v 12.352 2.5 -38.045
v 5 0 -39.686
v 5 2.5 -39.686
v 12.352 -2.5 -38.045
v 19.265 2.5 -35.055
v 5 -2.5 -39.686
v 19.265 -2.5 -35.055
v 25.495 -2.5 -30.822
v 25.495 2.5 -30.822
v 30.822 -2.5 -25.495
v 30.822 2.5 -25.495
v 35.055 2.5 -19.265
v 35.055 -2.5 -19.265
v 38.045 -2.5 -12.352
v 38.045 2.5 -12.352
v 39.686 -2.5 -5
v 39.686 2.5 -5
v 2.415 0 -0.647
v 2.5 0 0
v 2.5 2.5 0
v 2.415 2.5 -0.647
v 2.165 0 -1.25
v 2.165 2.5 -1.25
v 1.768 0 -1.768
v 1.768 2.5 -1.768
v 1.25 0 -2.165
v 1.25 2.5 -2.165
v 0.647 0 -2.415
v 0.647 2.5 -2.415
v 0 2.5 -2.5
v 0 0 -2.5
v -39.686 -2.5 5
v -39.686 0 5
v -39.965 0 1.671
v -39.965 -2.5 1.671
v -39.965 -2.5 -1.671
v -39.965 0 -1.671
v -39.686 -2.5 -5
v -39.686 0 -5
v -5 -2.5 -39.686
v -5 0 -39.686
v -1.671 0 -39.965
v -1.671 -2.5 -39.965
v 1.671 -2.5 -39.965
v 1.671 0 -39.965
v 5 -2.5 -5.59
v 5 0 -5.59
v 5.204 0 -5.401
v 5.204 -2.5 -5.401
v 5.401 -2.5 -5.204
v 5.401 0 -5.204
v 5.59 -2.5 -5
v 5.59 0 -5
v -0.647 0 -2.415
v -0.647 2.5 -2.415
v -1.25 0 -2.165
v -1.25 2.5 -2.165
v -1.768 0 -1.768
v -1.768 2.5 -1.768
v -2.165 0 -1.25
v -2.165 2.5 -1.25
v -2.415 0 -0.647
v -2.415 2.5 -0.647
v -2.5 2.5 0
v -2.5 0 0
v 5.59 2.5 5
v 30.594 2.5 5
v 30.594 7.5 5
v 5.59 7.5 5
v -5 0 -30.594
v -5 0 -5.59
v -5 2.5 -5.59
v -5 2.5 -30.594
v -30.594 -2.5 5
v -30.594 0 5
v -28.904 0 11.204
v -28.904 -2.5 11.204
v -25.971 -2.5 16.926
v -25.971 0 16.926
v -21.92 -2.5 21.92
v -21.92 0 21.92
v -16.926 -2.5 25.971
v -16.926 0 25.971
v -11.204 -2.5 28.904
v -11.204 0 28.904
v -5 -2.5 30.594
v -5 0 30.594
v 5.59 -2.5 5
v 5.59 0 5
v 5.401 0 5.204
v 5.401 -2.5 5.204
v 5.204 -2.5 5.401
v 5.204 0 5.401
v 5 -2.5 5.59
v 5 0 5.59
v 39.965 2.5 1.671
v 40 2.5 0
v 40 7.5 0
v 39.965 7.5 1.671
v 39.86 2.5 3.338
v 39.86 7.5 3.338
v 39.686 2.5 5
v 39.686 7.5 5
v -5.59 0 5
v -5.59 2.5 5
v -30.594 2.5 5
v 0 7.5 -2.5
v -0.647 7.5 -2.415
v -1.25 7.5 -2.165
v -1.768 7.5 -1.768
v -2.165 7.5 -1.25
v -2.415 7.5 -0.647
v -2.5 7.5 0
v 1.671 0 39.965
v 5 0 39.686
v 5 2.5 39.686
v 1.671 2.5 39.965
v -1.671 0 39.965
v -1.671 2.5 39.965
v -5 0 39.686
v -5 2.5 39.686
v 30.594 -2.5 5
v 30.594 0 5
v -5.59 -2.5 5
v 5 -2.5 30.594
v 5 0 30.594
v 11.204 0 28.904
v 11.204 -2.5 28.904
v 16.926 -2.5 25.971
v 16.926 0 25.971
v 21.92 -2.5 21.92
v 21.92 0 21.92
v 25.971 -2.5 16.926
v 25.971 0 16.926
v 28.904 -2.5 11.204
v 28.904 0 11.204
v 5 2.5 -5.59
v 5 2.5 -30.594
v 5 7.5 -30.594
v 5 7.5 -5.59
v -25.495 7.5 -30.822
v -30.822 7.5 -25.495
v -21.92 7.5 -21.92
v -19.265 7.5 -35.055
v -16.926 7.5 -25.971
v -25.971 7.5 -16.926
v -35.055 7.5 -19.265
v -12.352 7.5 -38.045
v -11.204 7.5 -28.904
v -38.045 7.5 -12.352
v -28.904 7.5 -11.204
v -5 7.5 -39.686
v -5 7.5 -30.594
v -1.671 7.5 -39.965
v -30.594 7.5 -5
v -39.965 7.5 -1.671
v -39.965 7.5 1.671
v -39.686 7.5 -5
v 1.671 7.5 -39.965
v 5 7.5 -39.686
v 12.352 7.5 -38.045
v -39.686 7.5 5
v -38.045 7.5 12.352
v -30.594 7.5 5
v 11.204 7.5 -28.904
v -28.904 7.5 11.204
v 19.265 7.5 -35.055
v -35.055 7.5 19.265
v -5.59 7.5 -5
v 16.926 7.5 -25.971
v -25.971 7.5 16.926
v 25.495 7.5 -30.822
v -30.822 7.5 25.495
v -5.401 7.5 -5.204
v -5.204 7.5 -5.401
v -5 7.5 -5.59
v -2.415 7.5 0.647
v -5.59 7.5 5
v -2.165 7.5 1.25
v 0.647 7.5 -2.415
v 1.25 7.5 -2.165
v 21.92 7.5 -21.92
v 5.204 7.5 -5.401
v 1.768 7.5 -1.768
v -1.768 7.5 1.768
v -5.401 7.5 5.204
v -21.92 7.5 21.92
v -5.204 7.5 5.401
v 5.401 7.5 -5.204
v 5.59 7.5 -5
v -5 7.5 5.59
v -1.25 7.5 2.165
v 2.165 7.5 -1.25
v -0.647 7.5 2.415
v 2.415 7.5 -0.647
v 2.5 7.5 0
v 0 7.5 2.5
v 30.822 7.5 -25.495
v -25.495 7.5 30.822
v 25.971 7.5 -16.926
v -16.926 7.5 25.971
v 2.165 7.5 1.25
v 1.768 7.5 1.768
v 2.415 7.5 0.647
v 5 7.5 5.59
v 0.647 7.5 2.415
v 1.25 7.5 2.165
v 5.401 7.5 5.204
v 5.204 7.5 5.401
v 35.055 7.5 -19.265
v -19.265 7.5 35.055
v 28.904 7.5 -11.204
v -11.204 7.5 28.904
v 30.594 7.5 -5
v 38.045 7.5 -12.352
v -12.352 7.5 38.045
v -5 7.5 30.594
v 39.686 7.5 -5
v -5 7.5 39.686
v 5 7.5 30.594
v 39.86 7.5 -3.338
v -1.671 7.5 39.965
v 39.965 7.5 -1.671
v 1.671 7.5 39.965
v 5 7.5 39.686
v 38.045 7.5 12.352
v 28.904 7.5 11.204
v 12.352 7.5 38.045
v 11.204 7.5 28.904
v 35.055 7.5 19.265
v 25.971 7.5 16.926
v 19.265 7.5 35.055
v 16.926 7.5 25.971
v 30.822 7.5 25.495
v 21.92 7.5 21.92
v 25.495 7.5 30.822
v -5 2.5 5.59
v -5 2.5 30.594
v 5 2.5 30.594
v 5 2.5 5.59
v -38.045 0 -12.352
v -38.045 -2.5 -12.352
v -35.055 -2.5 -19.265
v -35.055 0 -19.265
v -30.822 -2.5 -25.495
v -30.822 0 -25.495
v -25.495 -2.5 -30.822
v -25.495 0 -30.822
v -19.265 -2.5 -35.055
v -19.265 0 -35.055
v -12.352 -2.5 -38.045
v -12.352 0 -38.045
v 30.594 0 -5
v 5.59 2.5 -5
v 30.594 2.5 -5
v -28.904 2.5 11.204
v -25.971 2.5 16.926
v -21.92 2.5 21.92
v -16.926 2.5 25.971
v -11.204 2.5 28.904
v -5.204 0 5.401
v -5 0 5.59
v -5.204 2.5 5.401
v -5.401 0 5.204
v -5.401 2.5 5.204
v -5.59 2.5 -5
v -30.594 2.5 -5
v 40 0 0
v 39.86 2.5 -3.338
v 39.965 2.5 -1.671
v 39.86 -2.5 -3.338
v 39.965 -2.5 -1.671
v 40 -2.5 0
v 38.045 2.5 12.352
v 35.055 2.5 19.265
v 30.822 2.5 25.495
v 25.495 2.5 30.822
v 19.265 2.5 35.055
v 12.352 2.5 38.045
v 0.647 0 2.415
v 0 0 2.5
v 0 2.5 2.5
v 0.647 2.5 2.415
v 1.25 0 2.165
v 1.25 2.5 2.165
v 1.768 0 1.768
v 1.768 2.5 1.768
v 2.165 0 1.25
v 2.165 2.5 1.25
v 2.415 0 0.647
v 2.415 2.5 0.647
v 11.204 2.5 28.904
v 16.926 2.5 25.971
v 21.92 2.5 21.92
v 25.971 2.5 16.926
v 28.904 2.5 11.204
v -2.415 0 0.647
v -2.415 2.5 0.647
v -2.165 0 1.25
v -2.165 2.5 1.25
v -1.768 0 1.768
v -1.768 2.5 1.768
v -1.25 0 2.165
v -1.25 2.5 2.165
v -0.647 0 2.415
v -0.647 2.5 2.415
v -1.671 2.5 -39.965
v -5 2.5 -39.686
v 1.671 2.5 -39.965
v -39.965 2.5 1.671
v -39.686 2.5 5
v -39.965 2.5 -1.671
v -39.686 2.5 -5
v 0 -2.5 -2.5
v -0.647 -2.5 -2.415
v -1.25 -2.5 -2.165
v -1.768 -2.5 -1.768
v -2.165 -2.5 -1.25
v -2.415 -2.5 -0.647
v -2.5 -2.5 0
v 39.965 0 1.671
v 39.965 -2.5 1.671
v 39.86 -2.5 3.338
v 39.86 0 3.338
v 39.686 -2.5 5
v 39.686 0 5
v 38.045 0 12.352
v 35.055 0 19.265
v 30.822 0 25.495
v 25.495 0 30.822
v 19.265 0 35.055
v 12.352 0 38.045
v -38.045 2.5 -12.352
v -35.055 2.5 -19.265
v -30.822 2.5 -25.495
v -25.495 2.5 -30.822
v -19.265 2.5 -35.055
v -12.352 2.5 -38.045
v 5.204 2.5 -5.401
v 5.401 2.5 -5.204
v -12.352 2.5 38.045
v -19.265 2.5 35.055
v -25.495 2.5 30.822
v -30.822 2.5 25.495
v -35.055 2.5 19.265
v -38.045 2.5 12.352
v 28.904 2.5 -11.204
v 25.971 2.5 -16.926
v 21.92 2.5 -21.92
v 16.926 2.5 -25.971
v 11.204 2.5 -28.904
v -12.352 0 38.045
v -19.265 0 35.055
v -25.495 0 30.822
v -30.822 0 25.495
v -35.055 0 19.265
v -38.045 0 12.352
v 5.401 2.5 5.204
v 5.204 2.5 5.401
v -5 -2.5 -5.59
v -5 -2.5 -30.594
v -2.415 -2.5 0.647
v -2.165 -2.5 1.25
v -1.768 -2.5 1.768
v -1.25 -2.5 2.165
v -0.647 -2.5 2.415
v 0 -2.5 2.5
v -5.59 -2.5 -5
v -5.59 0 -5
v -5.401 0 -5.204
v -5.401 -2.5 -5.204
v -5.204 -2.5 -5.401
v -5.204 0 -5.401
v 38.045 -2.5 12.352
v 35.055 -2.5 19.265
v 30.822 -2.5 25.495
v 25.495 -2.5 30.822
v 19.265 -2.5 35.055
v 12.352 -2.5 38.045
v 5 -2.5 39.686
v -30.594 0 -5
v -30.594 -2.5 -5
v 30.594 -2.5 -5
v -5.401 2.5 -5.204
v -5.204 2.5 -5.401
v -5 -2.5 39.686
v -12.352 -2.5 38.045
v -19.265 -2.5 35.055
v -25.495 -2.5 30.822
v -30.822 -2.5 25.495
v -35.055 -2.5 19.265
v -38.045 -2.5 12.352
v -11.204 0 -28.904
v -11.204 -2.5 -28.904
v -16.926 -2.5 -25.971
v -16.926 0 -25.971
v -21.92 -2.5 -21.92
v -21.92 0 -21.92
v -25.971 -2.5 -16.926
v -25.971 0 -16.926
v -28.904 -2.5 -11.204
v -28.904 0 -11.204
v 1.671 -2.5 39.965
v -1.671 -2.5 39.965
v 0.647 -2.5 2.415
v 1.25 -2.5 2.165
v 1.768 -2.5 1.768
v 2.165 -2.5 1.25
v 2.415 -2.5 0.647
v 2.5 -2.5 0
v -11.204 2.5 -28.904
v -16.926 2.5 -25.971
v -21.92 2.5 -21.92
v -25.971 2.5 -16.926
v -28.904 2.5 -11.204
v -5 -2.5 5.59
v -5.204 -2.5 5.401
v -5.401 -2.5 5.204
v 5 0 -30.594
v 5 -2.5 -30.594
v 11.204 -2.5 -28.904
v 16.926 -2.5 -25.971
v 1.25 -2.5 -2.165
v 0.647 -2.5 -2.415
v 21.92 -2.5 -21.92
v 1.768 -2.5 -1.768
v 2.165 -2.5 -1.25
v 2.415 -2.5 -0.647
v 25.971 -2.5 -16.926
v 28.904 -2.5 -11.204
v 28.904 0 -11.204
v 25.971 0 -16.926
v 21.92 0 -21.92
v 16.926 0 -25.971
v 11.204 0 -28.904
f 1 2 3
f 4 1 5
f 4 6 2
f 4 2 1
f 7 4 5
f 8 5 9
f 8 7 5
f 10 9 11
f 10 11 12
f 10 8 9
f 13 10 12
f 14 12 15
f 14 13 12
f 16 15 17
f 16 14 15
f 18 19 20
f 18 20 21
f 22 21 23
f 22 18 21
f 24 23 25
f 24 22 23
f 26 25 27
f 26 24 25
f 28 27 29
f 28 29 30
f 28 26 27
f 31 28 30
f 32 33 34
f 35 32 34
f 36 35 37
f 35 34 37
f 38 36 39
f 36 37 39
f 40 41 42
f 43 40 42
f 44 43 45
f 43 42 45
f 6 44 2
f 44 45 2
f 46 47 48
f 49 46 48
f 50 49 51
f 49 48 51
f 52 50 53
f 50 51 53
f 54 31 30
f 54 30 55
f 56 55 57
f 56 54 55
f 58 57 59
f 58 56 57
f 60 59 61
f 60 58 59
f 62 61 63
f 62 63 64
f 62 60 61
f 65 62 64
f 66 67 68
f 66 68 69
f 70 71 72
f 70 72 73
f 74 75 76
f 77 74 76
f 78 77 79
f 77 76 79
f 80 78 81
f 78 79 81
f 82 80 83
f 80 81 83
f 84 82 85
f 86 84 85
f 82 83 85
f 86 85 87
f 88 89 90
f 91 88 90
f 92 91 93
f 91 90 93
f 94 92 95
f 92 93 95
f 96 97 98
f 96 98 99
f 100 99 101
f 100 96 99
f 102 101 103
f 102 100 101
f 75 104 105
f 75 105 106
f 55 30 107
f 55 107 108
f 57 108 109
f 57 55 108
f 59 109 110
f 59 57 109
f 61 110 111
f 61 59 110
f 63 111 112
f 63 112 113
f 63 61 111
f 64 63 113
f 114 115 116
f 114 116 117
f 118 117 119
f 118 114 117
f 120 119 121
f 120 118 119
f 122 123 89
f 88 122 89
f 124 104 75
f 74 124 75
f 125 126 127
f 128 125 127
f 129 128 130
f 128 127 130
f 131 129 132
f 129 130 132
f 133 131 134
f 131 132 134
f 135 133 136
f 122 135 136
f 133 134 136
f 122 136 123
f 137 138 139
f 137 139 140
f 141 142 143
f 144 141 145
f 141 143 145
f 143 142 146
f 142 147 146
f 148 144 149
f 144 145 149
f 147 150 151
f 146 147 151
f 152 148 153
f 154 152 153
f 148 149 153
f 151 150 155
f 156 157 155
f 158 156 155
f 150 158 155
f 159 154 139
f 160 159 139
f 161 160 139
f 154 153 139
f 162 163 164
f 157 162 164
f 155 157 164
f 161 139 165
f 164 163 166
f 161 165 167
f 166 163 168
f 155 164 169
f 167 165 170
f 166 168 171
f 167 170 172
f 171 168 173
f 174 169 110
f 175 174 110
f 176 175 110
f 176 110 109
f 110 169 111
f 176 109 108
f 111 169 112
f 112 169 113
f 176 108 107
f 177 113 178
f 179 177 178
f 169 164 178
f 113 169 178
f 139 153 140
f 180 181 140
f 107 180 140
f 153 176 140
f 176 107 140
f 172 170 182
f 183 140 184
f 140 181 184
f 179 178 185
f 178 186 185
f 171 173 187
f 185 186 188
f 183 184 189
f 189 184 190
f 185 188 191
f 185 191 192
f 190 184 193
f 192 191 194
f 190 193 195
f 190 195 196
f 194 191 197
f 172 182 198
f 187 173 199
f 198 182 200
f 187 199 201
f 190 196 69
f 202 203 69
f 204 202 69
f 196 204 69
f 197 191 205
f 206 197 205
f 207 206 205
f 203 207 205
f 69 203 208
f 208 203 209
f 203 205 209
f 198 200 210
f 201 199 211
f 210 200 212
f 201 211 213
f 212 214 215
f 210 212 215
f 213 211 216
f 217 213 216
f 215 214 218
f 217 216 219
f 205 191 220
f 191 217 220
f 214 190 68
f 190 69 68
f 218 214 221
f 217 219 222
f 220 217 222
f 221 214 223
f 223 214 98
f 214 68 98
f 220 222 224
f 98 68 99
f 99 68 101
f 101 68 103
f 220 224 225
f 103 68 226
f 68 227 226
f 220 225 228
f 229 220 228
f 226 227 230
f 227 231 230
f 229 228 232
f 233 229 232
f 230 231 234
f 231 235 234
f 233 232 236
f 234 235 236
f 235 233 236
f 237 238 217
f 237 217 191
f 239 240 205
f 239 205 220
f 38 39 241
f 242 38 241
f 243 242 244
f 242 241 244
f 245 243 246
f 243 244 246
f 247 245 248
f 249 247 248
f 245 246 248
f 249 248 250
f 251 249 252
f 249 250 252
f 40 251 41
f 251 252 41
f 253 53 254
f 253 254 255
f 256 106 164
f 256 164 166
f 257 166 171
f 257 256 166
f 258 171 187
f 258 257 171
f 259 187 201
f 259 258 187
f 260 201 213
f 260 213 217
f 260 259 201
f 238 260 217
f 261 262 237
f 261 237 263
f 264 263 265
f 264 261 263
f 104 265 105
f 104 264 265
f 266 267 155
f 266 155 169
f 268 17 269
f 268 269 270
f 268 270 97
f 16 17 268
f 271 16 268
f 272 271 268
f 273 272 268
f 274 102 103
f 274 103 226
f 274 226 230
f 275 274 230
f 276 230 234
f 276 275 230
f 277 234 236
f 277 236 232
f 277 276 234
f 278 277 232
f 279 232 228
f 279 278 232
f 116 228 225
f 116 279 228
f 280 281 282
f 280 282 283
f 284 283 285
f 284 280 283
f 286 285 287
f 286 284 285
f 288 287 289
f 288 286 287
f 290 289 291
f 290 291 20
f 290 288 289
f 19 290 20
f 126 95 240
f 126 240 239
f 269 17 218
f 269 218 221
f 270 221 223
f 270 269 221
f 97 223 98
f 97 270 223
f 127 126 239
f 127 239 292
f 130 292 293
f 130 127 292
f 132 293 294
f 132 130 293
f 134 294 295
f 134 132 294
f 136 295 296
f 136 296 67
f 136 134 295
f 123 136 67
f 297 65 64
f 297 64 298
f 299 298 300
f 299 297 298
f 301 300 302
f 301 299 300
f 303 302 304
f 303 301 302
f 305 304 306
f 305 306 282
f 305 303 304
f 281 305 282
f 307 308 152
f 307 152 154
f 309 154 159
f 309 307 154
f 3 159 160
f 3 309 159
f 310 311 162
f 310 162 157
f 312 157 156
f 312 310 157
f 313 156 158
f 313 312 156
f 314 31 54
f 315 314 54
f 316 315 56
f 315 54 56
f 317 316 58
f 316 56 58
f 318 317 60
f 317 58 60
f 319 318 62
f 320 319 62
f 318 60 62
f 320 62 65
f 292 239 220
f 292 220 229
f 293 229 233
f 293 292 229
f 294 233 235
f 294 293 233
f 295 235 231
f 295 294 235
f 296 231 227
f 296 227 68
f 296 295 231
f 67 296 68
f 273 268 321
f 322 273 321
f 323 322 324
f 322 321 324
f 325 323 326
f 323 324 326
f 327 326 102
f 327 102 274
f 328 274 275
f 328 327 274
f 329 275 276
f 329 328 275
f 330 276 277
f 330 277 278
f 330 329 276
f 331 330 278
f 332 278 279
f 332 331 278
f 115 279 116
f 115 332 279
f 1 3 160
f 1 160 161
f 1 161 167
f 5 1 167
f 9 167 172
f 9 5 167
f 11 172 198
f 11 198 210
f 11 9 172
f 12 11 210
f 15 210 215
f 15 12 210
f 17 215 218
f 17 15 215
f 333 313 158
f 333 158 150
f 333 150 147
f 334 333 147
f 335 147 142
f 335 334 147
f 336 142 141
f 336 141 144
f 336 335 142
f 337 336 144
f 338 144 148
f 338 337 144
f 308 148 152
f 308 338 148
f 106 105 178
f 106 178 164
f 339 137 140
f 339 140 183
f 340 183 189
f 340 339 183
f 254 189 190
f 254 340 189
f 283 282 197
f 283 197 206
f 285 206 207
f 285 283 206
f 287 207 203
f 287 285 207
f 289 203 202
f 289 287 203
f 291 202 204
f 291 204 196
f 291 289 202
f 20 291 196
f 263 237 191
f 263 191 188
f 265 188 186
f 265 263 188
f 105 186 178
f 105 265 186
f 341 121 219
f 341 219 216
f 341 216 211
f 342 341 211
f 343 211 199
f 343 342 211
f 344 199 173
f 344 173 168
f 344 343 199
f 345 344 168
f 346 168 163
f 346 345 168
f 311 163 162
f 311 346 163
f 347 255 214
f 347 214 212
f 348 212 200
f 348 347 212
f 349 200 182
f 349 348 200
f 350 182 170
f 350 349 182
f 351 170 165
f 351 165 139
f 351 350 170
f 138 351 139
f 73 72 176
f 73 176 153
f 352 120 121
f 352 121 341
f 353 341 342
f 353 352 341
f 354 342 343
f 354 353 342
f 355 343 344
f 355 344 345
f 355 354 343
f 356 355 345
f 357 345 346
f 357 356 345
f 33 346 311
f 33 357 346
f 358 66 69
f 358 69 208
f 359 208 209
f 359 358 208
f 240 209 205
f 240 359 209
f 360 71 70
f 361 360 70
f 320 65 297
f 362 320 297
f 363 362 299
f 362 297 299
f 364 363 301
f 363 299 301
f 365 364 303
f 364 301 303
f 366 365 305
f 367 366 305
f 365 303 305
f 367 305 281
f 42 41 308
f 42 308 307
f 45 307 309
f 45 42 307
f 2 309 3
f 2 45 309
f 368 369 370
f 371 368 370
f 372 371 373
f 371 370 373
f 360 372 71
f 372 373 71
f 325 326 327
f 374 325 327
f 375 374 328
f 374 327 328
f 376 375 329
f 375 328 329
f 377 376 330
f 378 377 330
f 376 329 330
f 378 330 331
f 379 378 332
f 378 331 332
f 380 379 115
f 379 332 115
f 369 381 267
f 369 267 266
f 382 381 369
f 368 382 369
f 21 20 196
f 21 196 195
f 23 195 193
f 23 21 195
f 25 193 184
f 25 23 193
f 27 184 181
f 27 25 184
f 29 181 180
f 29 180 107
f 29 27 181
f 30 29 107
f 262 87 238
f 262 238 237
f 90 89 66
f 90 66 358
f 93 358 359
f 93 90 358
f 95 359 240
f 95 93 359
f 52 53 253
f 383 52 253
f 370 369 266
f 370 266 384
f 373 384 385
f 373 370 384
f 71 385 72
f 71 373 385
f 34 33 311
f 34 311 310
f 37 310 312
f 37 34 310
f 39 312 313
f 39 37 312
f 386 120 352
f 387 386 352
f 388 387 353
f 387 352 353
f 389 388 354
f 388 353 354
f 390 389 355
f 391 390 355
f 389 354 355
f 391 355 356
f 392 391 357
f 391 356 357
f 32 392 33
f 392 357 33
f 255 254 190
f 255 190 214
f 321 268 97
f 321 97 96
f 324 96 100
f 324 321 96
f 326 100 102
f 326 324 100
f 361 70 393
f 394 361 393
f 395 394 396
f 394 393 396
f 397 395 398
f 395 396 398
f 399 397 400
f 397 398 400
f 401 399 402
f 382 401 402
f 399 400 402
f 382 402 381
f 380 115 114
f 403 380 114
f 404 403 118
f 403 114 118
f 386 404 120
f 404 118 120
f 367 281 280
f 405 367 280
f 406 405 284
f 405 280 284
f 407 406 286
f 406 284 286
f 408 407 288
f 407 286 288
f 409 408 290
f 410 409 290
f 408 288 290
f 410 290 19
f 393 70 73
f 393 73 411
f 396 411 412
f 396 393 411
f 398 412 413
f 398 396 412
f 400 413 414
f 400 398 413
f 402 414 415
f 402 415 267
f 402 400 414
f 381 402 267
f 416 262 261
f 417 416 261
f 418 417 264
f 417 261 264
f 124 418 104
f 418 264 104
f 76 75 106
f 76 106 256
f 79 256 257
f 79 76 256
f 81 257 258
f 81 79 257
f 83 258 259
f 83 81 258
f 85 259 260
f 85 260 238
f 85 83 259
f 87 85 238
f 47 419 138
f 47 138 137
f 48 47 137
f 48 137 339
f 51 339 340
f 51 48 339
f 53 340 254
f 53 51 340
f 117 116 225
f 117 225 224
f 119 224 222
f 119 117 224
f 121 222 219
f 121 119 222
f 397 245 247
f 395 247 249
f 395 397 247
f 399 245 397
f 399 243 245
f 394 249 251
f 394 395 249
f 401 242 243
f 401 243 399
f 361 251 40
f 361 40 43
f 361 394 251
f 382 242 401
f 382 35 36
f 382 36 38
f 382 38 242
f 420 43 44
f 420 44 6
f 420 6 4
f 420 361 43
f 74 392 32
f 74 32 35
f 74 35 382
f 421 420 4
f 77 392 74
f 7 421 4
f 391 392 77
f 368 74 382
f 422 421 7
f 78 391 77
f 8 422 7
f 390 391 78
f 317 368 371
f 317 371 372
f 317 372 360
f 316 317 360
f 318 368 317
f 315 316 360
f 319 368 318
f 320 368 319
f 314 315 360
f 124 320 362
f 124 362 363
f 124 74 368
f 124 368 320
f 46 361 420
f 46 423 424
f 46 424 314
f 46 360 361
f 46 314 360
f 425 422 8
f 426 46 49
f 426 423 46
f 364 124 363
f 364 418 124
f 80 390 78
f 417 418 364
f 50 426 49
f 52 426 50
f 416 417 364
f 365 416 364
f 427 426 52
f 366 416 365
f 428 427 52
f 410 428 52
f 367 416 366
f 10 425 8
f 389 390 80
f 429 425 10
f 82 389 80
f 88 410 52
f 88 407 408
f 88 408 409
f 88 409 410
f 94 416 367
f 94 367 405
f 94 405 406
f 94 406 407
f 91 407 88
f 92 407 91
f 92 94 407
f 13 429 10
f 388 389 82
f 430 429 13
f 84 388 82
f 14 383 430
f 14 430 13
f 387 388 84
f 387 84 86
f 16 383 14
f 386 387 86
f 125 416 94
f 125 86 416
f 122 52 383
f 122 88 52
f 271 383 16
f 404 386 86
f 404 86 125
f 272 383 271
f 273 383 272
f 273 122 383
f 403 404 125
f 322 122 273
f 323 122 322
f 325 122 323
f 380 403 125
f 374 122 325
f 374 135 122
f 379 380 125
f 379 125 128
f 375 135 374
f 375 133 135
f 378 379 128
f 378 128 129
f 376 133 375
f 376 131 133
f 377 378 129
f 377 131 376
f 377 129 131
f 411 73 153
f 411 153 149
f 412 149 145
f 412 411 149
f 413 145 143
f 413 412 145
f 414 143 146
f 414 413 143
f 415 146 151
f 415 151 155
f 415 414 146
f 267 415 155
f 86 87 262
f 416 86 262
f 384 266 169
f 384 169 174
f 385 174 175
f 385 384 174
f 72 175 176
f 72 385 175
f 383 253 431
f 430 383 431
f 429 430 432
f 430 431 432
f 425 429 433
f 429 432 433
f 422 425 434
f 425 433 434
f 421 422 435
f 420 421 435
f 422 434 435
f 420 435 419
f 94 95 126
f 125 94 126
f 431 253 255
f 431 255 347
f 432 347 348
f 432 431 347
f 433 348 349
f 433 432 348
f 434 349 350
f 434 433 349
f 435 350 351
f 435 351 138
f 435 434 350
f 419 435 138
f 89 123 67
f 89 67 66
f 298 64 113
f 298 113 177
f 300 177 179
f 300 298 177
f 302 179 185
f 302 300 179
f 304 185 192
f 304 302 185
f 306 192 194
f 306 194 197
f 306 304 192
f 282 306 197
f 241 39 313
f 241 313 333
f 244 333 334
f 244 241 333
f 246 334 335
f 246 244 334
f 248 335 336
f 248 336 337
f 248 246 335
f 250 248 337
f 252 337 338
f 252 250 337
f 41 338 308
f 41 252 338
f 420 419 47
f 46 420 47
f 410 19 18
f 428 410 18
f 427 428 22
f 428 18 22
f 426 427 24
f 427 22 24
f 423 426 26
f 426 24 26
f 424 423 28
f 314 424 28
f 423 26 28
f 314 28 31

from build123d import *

# Parameters (mm, degrees)
F1_DEPTH = 2.5
F2_DEPTH = 5


# Not quite as in the source:
# - a feature names something its author has since deleted; it is built from what else it names


with BuildPart() as f1:
    # F0 (on Front) → F1 (new body, symmetric)
    with BuildSketch(Plane.XZ):
        with BuildLine():
            ThreePointArc((39.686269666, -5), (39.9214903695, -2.5049165017), (40, 0))
            ThreePointArc((40, 0), (39.9214903695, 2.5049165017), (39.686269666, 5))
            ThreePointArc((39.686269666, 5), (28.2842712475, 28.2842712475), (5, 39.686269666))
            ThreePointArc((5, 39.686269666), (0, 40), (-5, 39.686269666))
            ThreePointArc((-5, 39.686269666), (-28.2842712475, 28.2842712475), (-39.686269666, 5))
            ThreePointArc((-39.686269666, 5), (-40, 0), (-39.686269666, -5))
            ThreePointArc((-39.686269666, -5), (-28.2842712475, -28.2842712475), (-5, -39.686269666))
            ThreePointArc((-5, -39.686269666), (0, -40), (5, -39.686269666))
            ThreePointArc((5, -39.686269666), (28.2842712475, -28.2842712475), (39.686269666, -5))
        make_face()
        with BuildLine():
            ThreePointArc((30.5941170816, 5), (30.8983626551, 2.5082235219), (31, 0))
            ThreePointArc((31, 0), (30.8983626551, -2.5082235219), (30.5941170816, -5))
            ThreePointArc((30.5941170816, -5), (21.9203102168, -21.9203102168), (5, -30.5941170816))
            ThreePointArc((5, -30.5941170816), (2.5082235219, -30.8983626551), (0, -31))
            ThreePointArc((0, -31), (-2.5082235219, -30.8983626551), (-5, -30.5941170816))
            ThreePointArc((-5, -30.5941170816), (-21.9203102168, -21.9203102168), (-30.5941170816, -5))
            ThreePointArc((-30.5941170816, -5), (-30.8983626551, -2.5082235219), (-31, 0))
            ThreePointArc((-31, 0), (-30.8983626551, 2.5082235219), (-30.5941170816, 5))
            ThreePointArc((-30.5941170816, 5), (-21.9203102168, 21.9203102168), (-5, 30.5941170816))
            ThreePointArc((-5, 30.5941170816), (-2.5082235219, 30.8983626551), (0, 31))
            ThreePointArc((0, 31), (2.5082235219, 30.8983626551), (5, 30.5941170816))
            ThreePointArc((5, 30.5941170816), (21.9203102168, 21.9203102168), (30.5941170816, 5))
        make_face(mode=Mode.SUBTRACT)
        with BuildLine():
            Line((7.5, 0), (31, 0))
            ThreePointArc((31, 0), (30.8983626551, 2.5082235219), (30.5941170816, 5))
            Line((30.5941170816, 5), (5.5901699437, 5))
            ThreePointArc((5.5901699437, 5), (7.0062926922, 2.6761656733), (7.5, 0))
        make_face()
        with BuildLine():
            ThreePointArc((30.5941170816, -5), (30.8983626551, -2.5082235219), (31, 0))
            Line((31, 0), (7.5, 0))
            ThreePointArc((7.5, 0), (7.0062926922, -2.6761656733), (5.5901699437, -5))
            Line((5.5901699437, -5), (30.5941170816, -5))
        make_face()
        with BuildLine():
            Line((2.5, 0), (7.5, 0))
            ThreePointArc((7.5, 0), (7.0062926922, 2.6761656733), (5.5901699437, 5))
            ThreePointArc((5.5901699437, 5), (5.3033008589, 5.3033008589), (5, 5.5901699437))
            ThreePointArc((5, 5.5901699437), (2.6761656733, 7.0062926922), (0, 7.5))
            Line((0, 7.5), (0, 2.5))
            ThreePointArc((0, 2.5), (1.767766953, 1.767766953), (2.5, 0))
        make_face()
        with BuildLine():
            ThreePointArc((5.5901699437, -5), (7.0062926922, -2.6761656733), (7.5, 0))
            Line((7.5, 0), (2.5, 0))
            ThreePointArc((2.5, 0), (1.767766953, -1.767766953), (0, -2.5))
            Line((0, -2.5), (0, -7.5))
            ThreePointArc((0, -7.5), (2.6761656733, -7.0062926922), (5, -5.5901699437))
            ThreePointArc((5, -5.5901699437), (5.3033008589, -5.3033008589), (5.5901699437, -5))
        make_face()
        with BuildLine():
            Line((5, 5.5901699437), (5, 30.5941170816))
            ThreePointArc((5, 30.5941170816), (2.5082235219, 30.8983626551), (0, 31))
            Line((0, 31), (0, 7.5))
            ThreePointArc((0, 7.5), (2.6761656733, 7.0062926922), (5, 5.5901699437))
        make_face()
        with BuildLine():
            ThreePointArc((0, -31), (2.5082235219, -30.8983626551), (5, -30.5941170816))
            Line((5, -30.5941170816), (5, -5.5901699437))
            ThreePointArc((5, -5.5901699437), (2.6761656733, -7.0062926922), (0, -7.5))
            Line((0, -7.5), (0, -31))
        make_face()
        with BuildLine():
            Line((0, 7.5), (0, 31))
            ThreePointArc((0, 31), (-2.5082235219, 30.8983626551), (-5, 30.5941170816))
            Line((-5, 30.5941170816), (-5, 5.5901699437))
            ThreePointArc((-5, 5.5901699437), (-2.6761656733, 7.0062926922), (0, 7.5))
        make_face()
        with BuildLine():
            ThreePointArc((-5, -30.5941170816), (-2.5082235219, -30.8983626551), (0, -31))
            Line((0, -31), (0, -7.5))
            ThreePointArc((0, -7.5), (-2.6761656733, -7.0062926922), (-5, -5.5901699437))
            Line((-5, -5.5901699437), (-5, -30.5941170816))
        make_face()
        with BuildLine():
            ThreePointArc((-2.5, 0), (-1.767766953, 1.767766953), (0, 2.5))
            Line((0, 2.5), (0, 7.5))
            ThreePointArc((0, 7.5), (-2.6761656733, 7.0062926922), (-5, 5.5901699437))
            ThreePointArc((-5, 5.5901699437), (-5.3033008589, 5.3033008589), (-5.5901699437, 5))
            ThreePointArc((-5.5901699437, 5), (-7.0062926922, 2.6761656733), (-7.5, 0))
            Line((-7.5, 0), (-2.5, 0))
        make_face()
        with BuildLine():
            Line((0, -7.5), (0, -2.5))
            ThreePointArc((0, -2.5), (-1.767766953, -1.767766953), (-2.5, 0))
            Line((-2.5, 0), (-7.5, 0))
            ThreePointArc((-7.5, 0), (-7.0062926922, -2.6761656733), (-5.5901699437, -5))
            ThreePointArc((-5.5901699437, -5), (-5.3033008589, -5.3033008589), (-5, -5.5901699437))
            ThreePointArc((-5, -5.5901699437), (-2.6761656733, -7.0062926922), (0, -7.5))
        make_face()
        with BuildLine():
            Line((-5.5901699437, 5), (-30.5941170816, 5))
            ThreePointArc((-30.5941170816, 5), (-30.8983626551, 2.5082235219), (-31, 0))
            Line((-31, 0), (-7.5, 0))
            ThreePointArc((-7.5, 0), (-7.0062926922, 2.6761656733), (-5.5901699437, 5))
        make_face()
        with BuildLine():
            ThreePointArc((-31, 0), (-30.8983626551, -2.5082235219), (-30.5941170816, -5))
            Line((-30.5941170816, -5), (-5.5901699437, -5))
            ThreePointArc((-5.5901699437, -5), (-7.0062926922, -2.6761656733), (-7.5, 0))
            Line((-7.5, 0), (-31, 0))
        make_face()
    extrude(amount=F1_DEPTH, both=True)

    # F2 (add): a face of the model
    f2_faces = [f1.faces().sort_by_distance(p)[0] for p in [
        (-38.5637724499, 2.5, 4.8585786438),
    ]]
    extrude(f2_faces, amount=F2_DEPTH)


solid = f1.part
